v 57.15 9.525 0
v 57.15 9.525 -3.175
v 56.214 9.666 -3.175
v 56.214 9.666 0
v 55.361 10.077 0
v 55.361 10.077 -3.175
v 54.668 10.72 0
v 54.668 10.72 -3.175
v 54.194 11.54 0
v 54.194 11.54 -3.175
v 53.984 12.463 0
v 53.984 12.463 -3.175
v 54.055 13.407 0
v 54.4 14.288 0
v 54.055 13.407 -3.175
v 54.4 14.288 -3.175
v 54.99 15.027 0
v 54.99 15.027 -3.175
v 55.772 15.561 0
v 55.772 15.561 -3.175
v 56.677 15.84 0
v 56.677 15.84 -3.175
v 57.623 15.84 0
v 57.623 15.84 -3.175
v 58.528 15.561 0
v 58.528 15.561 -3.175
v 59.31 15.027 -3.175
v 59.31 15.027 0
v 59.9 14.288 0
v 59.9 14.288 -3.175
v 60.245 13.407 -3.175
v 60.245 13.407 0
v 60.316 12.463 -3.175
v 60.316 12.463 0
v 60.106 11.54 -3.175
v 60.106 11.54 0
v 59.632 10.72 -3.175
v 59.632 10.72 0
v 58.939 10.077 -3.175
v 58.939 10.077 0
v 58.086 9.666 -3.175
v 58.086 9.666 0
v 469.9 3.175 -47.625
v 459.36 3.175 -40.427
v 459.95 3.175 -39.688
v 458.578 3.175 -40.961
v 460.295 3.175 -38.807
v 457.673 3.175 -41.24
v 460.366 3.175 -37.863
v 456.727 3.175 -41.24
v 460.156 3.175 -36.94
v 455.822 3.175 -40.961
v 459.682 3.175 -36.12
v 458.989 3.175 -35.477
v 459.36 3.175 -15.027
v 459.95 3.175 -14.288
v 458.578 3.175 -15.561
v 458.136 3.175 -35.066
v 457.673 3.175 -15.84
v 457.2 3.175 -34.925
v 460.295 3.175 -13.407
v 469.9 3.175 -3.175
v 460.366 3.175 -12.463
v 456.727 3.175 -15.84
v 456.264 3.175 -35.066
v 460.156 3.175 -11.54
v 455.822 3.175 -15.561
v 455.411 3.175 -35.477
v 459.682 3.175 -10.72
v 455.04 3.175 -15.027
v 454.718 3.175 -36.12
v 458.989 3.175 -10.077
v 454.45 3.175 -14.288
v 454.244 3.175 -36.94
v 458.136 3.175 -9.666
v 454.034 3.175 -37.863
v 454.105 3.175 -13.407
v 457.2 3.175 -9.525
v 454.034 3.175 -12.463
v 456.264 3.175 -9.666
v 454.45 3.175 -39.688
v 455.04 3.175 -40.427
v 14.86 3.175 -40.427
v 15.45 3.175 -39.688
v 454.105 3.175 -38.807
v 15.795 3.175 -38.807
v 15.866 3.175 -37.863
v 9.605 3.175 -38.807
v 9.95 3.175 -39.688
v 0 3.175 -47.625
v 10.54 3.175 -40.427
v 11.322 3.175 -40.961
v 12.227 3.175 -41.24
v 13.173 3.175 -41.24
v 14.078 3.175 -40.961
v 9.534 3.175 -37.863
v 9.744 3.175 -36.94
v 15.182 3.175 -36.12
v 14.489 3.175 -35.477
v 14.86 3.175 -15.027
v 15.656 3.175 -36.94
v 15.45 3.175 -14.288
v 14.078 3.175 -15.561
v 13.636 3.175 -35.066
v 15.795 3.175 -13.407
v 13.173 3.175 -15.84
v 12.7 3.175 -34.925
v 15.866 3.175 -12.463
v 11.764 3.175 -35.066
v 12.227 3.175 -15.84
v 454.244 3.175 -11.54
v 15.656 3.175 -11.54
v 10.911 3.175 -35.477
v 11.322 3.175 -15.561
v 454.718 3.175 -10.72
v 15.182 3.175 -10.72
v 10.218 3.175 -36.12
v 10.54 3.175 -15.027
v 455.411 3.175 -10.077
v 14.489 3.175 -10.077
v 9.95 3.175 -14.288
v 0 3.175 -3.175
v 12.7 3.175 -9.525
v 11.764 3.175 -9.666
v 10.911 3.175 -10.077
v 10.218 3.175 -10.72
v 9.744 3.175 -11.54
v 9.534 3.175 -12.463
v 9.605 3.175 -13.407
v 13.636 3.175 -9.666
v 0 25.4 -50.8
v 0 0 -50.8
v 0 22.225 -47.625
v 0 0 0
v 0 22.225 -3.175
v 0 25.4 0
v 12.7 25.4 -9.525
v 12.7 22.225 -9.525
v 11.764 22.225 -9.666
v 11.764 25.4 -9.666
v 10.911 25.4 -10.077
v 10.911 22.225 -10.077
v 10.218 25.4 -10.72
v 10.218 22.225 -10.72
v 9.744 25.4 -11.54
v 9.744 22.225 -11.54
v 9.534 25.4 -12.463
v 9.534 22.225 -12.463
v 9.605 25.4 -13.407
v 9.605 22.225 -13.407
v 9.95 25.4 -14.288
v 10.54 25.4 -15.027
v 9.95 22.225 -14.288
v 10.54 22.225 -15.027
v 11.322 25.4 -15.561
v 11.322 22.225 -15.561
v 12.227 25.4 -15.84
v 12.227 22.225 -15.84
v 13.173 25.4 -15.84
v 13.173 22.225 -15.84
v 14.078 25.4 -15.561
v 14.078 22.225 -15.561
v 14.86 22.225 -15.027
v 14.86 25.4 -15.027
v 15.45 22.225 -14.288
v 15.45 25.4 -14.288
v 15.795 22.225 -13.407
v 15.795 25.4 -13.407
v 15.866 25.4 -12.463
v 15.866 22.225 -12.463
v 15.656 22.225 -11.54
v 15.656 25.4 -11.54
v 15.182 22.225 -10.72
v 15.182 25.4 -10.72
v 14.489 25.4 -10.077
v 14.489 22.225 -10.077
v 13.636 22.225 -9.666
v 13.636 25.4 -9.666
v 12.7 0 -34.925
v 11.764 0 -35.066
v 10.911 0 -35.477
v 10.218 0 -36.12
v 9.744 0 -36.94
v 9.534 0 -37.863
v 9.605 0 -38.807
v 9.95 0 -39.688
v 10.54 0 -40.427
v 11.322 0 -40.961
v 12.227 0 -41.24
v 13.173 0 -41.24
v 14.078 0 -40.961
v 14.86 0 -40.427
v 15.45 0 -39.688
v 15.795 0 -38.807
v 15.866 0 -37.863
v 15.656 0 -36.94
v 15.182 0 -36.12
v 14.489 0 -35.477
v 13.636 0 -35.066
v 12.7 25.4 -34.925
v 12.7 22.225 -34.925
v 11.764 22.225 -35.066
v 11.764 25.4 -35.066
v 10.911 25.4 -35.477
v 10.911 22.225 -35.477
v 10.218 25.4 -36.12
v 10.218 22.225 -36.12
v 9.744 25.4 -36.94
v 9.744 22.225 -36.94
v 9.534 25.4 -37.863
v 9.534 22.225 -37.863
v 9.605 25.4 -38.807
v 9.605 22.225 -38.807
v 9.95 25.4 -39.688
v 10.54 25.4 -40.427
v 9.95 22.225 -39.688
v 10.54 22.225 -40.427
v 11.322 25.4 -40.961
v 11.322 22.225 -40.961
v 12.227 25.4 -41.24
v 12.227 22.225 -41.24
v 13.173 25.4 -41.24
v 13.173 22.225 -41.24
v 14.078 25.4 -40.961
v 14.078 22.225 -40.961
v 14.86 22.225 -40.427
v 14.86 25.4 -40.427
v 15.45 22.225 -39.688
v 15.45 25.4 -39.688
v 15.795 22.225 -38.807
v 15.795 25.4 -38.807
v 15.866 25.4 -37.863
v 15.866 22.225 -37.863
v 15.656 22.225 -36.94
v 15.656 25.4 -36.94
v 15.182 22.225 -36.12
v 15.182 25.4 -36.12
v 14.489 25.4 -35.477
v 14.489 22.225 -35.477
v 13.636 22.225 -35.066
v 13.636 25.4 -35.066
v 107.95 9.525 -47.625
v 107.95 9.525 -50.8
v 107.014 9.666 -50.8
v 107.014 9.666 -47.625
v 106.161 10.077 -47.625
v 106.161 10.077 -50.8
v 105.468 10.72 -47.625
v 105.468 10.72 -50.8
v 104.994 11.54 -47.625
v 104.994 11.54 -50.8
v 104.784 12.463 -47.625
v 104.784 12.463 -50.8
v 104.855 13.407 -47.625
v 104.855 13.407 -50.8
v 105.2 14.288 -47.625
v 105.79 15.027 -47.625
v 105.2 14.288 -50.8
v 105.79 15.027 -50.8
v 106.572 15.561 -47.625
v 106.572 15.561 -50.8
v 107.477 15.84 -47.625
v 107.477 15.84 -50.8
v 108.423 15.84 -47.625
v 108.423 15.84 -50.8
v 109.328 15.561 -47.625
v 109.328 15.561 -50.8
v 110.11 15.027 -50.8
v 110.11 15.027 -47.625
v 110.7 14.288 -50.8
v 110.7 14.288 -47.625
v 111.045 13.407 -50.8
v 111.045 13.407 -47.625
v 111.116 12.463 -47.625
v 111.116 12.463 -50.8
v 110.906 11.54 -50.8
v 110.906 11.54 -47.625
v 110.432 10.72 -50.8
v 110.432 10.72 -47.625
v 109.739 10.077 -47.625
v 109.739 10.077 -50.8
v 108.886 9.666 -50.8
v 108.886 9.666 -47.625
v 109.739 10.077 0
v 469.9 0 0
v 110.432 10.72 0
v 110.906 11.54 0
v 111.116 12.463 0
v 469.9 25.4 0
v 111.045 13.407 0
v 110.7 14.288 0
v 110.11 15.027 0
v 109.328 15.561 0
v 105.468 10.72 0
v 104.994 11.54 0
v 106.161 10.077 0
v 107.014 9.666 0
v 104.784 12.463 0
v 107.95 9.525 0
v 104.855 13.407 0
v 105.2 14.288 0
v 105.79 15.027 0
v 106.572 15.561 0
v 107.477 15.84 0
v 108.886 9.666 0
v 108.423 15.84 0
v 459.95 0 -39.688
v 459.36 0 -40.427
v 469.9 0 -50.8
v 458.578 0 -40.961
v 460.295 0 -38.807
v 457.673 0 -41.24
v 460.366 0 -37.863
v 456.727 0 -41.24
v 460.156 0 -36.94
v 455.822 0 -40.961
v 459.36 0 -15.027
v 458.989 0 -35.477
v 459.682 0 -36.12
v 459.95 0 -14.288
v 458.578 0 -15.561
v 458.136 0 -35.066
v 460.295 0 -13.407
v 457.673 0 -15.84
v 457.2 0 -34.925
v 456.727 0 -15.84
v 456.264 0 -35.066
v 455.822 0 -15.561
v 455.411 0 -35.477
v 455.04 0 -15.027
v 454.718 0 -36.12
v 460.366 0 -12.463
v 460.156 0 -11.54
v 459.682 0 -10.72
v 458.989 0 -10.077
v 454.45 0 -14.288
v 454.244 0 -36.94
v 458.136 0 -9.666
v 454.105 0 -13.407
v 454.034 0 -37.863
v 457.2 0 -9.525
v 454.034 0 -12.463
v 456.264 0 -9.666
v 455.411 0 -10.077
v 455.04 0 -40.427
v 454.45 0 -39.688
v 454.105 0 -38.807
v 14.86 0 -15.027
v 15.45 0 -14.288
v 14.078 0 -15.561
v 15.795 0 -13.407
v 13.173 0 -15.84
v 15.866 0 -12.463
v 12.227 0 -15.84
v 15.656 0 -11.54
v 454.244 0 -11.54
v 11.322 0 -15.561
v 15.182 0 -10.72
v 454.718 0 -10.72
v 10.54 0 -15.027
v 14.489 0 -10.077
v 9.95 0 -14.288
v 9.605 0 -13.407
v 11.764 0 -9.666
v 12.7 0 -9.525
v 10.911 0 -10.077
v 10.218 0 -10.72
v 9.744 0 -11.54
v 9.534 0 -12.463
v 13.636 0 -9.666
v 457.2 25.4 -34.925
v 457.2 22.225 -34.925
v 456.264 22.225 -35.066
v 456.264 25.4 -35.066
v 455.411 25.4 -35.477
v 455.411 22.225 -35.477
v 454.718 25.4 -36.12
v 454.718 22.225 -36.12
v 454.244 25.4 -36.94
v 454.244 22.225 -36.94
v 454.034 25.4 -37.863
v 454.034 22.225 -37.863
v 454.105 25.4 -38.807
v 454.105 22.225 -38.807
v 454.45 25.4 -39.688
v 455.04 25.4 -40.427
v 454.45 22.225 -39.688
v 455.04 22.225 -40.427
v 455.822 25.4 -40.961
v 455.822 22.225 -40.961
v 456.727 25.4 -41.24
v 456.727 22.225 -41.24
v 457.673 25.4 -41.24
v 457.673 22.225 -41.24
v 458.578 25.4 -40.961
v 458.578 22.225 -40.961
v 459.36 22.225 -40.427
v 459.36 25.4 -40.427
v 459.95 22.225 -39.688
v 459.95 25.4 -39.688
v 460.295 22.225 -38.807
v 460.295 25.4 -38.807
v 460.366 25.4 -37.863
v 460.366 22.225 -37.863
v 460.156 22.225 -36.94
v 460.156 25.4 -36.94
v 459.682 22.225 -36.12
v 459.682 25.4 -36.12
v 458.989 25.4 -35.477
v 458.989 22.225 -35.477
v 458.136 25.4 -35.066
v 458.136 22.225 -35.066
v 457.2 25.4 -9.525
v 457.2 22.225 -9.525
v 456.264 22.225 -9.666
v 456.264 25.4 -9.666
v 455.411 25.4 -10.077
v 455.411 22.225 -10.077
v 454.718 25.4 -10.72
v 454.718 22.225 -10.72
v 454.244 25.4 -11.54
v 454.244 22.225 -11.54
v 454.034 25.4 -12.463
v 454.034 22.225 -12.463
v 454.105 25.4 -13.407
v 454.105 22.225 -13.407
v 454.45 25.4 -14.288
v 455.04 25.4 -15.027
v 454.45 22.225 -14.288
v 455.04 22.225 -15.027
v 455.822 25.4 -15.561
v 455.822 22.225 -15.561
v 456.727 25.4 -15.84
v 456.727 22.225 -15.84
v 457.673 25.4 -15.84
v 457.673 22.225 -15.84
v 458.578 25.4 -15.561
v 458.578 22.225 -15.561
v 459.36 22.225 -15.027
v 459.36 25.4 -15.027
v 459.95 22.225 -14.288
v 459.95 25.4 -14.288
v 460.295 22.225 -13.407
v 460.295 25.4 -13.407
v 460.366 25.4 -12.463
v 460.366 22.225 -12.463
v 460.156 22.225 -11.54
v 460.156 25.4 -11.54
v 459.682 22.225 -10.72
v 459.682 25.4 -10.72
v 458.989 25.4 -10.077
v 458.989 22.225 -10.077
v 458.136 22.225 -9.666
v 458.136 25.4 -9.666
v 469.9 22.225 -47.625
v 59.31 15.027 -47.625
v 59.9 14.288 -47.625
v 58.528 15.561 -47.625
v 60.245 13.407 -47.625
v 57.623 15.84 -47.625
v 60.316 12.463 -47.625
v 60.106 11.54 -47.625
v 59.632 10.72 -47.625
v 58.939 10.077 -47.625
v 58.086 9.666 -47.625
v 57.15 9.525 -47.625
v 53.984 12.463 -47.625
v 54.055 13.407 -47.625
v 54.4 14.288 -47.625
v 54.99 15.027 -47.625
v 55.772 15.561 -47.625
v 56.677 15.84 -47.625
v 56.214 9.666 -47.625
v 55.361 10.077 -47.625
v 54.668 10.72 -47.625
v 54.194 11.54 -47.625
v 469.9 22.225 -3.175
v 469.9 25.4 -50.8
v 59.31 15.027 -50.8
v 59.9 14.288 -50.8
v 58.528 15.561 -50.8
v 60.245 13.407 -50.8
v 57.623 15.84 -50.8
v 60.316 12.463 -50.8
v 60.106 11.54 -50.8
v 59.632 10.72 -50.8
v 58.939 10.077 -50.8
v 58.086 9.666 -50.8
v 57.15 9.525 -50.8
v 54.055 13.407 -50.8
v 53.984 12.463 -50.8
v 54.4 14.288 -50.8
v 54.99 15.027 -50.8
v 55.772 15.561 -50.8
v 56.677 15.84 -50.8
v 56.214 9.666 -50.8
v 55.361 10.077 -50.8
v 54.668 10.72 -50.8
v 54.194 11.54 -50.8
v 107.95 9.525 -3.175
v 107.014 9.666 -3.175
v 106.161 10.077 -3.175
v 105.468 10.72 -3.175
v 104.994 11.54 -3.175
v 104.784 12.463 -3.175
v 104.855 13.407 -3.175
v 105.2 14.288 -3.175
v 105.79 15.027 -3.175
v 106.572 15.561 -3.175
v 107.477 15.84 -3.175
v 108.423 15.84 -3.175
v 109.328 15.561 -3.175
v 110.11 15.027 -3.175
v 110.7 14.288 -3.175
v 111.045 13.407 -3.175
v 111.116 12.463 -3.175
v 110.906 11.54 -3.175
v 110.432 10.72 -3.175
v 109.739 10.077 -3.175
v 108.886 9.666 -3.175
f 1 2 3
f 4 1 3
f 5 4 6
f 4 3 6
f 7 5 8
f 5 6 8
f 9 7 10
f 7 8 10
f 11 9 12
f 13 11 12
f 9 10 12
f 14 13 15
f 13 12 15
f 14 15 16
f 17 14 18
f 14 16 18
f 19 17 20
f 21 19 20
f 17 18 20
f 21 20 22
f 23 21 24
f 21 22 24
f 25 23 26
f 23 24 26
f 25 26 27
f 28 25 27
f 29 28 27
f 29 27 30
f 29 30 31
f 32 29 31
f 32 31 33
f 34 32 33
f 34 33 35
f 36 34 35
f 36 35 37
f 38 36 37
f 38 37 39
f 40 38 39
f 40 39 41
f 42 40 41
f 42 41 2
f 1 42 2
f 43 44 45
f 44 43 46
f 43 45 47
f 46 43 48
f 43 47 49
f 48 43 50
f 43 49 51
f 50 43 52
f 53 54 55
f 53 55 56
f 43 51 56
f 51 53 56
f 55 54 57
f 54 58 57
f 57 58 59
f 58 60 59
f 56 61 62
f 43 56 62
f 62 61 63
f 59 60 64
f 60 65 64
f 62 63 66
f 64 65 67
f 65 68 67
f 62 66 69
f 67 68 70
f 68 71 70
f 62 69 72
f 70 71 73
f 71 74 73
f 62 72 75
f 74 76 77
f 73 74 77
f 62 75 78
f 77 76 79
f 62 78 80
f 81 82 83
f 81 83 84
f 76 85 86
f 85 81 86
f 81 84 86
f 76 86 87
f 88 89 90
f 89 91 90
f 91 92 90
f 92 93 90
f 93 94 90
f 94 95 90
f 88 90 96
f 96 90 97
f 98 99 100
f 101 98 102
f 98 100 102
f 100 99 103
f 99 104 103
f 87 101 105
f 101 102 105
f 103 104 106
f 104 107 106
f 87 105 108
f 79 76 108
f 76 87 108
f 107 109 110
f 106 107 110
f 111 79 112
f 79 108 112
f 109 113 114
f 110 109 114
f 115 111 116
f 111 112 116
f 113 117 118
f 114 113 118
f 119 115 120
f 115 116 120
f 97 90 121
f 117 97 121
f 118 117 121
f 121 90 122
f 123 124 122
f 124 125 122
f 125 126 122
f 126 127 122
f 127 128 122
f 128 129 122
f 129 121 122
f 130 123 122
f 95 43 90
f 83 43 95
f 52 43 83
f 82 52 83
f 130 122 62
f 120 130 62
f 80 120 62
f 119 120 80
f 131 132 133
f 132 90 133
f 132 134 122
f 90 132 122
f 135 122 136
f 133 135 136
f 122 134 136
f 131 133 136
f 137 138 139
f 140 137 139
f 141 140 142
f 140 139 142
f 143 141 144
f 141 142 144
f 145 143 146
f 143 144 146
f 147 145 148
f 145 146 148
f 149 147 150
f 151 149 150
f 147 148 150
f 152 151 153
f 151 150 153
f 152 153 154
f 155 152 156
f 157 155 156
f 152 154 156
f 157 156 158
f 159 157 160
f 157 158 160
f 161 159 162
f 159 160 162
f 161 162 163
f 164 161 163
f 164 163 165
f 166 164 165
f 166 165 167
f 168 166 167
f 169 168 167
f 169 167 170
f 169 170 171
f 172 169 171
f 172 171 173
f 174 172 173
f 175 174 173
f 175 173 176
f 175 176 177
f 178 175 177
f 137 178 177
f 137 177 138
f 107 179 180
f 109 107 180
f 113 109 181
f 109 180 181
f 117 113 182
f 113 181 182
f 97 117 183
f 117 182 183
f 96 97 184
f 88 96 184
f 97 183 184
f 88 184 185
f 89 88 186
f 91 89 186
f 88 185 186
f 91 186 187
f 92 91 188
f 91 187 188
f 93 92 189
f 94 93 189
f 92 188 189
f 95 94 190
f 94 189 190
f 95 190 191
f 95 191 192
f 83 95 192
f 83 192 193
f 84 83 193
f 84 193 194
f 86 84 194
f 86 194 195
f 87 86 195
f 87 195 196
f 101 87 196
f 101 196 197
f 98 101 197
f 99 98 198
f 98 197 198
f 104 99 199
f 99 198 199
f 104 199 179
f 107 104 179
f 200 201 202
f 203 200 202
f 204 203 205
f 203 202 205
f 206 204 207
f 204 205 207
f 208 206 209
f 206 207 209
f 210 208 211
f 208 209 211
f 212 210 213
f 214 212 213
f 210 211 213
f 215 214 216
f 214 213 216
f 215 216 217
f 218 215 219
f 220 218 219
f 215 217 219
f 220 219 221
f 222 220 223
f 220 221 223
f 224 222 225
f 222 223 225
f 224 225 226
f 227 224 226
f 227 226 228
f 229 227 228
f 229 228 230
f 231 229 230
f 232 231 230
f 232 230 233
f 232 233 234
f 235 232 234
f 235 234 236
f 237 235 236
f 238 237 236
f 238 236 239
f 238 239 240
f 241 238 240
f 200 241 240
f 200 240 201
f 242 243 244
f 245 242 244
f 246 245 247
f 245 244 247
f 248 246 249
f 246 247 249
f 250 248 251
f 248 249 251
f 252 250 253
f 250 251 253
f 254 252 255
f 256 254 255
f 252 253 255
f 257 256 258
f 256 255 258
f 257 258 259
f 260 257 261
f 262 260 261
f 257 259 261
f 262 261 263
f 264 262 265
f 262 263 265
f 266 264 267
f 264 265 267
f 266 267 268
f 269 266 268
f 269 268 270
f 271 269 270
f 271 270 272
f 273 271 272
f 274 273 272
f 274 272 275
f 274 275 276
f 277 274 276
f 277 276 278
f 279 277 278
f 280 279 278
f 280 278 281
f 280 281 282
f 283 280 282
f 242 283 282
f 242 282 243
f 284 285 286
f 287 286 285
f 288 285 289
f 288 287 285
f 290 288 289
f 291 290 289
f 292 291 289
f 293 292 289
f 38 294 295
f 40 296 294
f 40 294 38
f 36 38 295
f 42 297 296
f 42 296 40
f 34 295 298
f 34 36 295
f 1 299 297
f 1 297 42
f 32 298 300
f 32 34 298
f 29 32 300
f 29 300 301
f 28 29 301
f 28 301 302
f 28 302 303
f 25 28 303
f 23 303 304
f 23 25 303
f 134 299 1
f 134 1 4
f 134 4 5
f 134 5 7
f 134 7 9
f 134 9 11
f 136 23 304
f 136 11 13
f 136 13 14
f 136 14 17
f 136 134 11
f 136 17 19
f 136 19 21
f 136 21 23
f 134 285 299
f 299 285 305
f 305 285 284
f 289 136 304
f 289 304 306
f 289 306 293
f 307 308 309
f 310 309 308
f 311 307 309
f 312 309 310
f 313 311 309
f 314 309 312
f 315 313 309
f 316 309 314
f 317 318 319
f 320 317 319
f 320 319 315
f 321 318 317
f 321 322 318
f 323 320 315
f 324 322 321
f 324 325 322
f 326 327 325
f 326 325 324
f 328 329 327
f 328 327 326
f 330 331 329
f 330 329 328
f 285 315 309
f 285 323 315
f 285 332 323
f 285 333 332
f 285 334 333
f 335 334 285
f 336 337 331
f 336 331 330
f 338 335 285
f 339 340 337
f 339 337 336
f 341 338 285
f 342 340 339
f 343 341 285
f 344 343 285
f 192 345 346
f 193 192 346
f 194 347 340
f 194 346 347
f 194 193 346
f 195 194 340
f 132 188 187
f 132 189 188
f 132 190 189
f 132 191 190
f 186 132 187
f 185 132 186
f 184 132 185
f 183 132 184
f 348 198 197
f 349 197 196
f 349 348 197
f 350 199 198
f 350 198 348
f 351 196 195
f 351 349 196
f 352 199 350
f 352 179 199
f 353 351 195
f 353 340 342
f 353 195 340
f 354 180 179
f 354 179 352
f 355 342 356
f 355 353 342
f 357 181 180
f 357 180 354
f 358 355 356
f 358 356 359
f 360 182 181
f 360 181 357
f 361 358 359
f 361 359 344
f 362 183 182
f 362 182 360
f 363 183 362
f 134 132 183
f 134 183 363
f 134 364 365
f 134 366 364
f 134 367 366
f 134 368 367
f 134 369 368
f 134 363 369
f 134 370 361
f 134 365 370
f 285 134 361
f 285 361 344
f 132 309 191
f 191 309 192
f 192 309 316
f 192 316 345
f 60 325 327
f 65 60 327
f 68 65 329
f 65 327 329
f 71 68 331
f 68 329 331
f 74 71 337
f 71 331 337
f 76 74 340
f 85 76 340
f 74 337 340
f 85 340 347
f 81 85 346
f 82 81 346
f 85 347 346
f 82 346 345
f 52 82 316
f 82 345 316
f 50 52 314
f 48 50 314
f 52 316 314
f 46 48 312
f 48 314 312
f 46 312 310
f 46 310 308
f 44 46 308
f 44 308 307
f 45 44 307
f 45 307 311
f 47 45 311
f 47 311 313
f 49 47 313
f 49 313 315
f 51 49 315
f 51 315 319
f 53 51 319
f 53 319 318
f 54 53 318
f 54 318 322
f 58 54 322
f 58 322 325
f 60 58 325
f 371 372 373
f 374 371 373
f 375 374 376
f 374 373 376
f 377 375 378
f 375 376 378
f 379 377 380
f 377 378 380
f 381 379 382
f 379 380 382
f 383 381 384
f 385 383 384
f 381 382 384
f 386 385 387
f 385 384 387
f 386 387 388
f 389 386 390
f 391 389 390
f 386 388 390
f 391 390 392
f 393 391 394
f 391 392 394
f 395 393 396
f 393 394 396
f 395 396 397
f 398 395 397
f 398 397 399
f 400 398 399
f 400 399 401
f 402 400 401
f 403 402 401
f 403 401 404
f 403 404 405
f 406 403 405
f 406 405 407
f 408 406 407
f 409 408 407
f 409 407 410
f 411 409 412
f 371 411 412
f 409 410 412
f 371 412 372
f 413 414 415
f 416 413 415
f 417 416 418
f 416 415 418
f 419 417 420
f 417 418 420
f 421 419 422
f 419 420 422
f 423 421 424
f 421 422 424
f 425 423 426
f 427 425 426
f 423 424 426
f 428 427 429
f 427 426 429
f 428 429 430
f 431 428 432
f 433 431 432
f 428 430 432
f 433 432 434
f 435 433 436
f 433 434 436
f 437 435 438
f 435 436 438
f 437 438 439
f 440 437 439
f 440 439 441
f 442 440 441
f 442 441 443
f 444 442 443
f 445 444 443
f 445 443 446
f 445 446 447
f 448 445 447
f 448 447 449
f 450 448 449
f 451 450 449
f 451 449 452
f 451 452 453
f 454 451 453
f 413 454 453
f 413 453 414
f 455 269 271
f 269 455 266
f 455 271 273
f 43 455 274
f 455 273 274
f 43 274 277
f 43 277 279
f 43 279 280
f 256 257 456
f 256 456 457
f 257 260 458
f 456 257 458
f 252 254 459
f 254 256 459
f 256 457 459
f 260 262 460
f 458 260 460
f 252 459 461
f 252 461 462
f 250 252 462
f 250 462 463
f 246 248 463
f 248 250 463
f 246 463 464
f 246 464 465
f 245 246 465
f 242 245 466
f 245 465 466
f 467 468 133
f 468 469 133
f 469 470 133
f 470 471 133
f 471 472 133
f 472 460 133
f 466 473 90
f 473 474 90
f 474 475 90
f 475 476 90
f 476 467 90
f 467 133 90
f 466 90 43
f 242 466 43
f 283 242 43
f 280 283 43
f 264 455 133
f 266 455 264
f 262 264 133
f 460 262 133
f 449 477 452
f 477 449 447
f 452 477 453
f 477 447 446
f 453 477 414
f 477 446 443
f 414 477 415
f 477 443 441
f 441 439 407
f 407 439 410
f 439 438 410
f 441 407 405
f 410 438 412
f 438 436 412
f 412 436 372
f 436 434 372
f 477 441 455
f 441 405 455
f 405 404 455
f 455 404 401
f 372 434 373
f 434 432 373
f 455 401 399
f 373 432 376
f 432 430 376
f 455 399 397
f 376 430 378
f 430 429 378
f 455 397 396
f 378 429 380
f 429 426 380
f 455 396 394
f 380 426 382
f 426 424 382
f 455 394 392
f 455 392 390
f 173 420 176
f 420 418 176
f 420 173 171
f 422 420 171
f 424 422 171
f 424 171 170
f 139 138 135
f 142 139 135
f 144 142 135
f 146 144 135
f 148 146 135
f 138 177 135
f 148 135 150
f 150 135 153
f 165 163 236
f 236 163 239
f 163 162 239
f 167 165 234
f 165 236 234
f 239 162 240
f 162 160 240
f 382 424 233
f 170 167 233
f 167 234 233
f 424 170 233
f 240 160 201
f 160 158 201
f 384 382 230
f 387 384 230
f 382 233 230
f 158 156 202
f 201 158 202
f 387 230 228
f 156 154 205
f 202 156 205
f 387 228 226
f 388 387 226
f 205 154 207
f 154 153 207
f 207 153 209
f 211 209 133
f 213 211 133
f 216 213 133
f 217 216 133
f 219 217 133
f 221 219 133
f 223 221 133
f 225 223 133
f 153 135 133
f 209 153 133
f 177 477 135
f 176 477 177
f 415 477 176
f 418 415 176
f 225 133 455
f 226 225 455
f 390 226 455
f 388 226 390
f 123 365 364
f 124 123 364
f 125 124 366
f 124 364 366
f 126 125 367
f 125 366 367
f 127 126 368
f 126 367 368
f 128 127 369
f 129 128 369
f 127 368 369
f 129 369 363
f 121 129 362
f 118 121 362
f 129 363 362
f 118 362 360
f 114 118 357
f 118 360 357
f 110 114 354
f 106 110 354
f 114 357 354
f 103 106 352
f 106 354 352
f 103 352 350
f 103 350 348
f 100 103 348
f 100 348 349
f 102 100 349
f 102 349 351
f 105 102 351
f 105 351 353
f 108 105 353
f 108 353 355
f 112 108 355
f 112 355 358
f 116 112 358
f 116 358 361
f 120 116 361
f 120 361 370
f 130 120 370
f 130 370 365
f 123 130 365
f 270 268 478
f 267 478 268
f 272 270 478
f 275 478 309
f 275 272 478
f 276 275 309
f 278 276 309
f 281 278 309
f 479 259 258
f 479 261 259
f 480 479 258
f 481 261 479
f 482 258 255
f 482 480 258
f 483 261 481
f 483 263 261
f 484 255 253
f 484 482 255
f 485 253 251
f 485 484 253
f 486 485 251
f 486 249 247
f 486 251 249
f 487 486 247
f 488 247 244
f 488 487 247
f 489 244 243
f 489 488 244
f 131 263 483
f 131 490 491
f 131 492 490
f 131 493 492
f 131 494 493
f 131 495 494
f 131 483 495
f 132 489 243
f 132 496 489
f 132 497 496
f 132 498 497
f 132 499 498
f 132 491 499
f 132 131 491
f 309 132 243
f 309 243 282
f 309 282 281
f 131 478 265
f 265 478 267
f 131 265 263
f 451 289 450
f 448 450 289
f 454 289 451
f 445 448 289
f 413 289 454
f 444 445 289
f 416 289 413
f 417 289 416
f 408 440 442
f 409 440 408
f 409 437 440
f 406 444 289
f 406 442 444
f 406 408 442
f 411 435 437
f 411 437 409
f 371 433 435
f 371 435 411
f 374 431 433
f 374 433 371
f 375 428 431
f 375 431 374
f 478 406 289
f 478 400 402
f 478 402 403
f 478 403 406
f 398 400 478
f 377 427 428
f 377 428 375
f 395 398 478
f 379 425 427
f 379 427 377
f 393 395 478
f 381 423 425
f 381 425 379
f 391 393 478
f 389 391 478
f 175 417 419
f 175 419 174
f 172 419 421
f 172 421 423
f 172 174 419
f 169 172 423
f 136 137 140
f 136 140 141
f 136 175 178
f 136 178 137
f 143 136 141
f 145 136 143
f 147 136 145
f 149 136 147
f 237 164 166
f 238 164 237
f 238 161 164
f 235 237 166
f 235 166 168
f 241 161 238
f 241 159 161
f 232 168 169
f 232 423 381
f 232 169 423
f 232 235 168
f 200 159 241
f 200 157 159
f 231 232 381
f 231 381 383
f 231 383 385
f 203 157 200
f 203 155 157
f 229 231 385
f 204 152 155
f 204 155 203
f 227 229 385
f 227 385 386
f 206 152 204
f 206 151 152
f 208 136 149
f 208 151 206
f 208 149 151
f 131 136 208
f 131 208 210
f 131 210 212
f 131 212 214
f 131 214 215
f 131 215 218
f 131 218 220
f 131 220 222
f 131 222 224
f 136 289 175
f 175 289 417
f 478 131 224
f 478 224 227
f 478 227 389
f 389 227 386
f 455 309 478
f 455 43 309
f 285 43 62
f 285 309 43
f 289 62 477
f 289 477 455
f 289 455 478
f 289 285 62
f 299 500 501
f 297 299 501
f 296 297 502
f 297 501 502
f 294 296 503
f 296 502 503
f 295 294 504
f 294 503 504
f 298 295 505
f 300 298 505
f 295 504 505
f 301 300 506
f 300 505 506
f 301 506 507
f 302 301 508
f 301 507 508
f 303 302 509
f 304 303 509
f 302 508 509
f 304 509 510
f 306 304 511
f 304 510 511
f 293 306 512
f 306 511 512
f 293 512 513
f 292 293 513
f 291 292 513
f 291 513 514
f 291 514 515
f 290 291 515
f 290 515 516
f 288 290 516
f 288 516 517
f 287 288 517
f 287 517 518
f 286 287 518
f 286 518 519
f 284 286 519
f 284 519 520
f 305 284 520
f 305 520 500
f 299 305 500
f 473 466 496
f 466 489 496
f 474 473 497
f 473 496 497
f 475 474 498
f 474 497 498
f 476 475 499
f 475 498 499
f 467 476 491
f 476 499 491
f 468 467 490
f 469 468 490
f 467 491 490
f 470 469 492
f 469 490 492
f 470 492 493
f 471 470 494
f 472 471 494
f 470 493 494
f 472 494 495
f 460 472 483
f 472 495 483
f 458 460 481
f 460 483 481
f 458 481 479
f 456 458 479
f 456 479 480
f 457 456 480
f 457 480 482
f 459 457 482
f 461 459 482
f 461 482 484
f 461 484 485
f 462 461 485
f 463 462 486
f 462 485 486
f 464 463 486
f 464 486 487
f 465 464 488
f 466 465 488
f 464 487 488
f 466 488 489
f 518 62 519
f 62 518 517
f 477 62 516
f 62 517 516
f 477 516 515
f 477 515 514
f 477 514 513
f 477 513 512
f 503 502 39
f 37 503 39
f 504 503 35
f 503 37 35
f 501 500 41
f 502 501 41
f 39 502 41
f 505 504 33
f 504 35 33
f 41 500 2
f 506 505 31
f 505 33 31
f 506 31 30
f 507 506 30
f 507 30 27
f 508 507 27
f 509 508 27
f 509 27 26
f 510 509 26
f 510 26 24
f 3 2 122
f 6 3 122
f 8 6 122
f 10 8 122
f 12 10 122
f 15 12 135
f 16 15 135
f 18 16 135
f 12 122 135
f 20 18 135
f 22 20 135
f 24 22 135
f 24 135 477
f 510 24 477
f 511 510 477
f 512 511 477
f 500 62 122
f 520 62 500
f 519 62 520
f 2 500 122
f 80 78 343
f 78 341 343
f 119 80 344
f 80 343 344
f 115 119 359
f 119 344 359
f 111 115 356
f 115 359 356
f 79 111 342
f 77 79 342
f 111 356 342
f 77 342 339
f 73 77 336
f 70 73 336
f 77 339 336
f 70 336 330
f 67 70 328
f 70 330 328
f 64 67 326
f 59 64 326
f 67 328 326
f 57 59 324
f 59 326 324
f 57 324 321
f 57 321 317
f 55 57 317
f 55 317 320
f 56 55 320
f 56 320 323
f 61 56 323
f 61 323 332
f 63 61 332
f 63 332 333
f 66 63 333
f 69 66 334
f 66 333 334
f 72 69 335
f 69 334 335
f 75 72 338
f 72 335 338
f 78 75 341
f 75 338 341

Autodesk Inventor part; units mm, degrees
ref_plane "YZ Plane" through (0, 0, 0) normal (1, 0, 0) x (0, 1, 0)
ref_plane "XZ Plane" through (0, 0, 0) normal (0, 1, 0) x (-1, 0, 0)
ref_plane "XY Plane" through (0, 0, 0) normal (0, 0, 1) x (1, 0, 0)
sketch "Sketch1" plane through (0, 0, 0) normal (1, 0, 0) x (0, 1, 0)
  line L0 (0, 0) -> (25.4, 0)
  line L1 (25.4, 0) -> (25.4, -50.8)
  line L2 (25.4, -50.8) -> (0, -50.8)
  line L3 (0, -50.8) -> (0, 0)
  line L4 (3.175, -3.175) -> (22.225, -3.175)
  line L5 (22.225, -3.175) -> (22.225, -47.625)
  line L6 (22.225, -47.625) -> (3.175, -47.625)
  line L7 (3.175, -47.625) -> (3.175, -3.175)
  dimension "d0" = 25.4
  dimension "d1" = 50.8
  dimension "d2" = 19.05
  dimension "d3" = 44.45
  dimension "d4" = 3.175
  dimension "d5" = 3.175
extrude "Extrusion1" add sketch "Sketch1" along normal blind 469.9
sketch "Sketch2" plane through (0, 25.4, 0) normal (0, 1, 0) x (1, 0, 0)
  line L0 (0, 0) -> (0, 50.8) projected
  line L1 (0, 0) -> (469.9, 0) projected
  line L2 (469.9, 50.8) -> (469.9, 0) projected
  line L3 (0, 50.8) -> (469.9, 50.8) projected
  point P0 (12.7, 12.7)
  point P1 (12.7, 38.1)
  point P2 (457.2, 12.7)
  point P3 (457.2, 38.1)
  dimension "d8" = 12.7
  dimension "d9" = 12.7
  dimension "d10" = 12.7
  dimension "d11" = 12.7
  dimension "d12" = 12.7
  dimension "d13" = 12.7
  dimension "d14" = 12.7
  dimension "d15" = 12.7
hole "Hole1" at (12.7, 25.4, -12.7) at (12.7, 25.4, -38.1) at (457.2, 25.4, -12.7) at (457.2, 25.4, -38.1) direction (0, -1, 0) diameter 6.35 end through all
sketch "Sketch3" plane through (0, 0, 0) normal (0, 0, 1) x (1, 0, 0)
  line L0 (0, 0) -> (0, 25.4) projected
  line L1 (0, 0) -> (469.9, 0) projected
  line L2 (469.9, 25.4) -> (469.9, 0) projected
  line L3 (0, 25.4) -> (469.9, 25.4) projected
  point P0 (57.15, 12.7)
  point P1 (107.95, 12.7)
  dimension "d23" = 57.15
  dimension "d24" = 12.7
  dimension "d25" = 12.7
  dimension "d26" = 107.95
hole "Hole2" at (57.15, 12.7, 0) at (107.95, 12.7, 0) direction (0, 0, -1) diameter 6.35 end through all
properties part number "2x1 support horizontal"
